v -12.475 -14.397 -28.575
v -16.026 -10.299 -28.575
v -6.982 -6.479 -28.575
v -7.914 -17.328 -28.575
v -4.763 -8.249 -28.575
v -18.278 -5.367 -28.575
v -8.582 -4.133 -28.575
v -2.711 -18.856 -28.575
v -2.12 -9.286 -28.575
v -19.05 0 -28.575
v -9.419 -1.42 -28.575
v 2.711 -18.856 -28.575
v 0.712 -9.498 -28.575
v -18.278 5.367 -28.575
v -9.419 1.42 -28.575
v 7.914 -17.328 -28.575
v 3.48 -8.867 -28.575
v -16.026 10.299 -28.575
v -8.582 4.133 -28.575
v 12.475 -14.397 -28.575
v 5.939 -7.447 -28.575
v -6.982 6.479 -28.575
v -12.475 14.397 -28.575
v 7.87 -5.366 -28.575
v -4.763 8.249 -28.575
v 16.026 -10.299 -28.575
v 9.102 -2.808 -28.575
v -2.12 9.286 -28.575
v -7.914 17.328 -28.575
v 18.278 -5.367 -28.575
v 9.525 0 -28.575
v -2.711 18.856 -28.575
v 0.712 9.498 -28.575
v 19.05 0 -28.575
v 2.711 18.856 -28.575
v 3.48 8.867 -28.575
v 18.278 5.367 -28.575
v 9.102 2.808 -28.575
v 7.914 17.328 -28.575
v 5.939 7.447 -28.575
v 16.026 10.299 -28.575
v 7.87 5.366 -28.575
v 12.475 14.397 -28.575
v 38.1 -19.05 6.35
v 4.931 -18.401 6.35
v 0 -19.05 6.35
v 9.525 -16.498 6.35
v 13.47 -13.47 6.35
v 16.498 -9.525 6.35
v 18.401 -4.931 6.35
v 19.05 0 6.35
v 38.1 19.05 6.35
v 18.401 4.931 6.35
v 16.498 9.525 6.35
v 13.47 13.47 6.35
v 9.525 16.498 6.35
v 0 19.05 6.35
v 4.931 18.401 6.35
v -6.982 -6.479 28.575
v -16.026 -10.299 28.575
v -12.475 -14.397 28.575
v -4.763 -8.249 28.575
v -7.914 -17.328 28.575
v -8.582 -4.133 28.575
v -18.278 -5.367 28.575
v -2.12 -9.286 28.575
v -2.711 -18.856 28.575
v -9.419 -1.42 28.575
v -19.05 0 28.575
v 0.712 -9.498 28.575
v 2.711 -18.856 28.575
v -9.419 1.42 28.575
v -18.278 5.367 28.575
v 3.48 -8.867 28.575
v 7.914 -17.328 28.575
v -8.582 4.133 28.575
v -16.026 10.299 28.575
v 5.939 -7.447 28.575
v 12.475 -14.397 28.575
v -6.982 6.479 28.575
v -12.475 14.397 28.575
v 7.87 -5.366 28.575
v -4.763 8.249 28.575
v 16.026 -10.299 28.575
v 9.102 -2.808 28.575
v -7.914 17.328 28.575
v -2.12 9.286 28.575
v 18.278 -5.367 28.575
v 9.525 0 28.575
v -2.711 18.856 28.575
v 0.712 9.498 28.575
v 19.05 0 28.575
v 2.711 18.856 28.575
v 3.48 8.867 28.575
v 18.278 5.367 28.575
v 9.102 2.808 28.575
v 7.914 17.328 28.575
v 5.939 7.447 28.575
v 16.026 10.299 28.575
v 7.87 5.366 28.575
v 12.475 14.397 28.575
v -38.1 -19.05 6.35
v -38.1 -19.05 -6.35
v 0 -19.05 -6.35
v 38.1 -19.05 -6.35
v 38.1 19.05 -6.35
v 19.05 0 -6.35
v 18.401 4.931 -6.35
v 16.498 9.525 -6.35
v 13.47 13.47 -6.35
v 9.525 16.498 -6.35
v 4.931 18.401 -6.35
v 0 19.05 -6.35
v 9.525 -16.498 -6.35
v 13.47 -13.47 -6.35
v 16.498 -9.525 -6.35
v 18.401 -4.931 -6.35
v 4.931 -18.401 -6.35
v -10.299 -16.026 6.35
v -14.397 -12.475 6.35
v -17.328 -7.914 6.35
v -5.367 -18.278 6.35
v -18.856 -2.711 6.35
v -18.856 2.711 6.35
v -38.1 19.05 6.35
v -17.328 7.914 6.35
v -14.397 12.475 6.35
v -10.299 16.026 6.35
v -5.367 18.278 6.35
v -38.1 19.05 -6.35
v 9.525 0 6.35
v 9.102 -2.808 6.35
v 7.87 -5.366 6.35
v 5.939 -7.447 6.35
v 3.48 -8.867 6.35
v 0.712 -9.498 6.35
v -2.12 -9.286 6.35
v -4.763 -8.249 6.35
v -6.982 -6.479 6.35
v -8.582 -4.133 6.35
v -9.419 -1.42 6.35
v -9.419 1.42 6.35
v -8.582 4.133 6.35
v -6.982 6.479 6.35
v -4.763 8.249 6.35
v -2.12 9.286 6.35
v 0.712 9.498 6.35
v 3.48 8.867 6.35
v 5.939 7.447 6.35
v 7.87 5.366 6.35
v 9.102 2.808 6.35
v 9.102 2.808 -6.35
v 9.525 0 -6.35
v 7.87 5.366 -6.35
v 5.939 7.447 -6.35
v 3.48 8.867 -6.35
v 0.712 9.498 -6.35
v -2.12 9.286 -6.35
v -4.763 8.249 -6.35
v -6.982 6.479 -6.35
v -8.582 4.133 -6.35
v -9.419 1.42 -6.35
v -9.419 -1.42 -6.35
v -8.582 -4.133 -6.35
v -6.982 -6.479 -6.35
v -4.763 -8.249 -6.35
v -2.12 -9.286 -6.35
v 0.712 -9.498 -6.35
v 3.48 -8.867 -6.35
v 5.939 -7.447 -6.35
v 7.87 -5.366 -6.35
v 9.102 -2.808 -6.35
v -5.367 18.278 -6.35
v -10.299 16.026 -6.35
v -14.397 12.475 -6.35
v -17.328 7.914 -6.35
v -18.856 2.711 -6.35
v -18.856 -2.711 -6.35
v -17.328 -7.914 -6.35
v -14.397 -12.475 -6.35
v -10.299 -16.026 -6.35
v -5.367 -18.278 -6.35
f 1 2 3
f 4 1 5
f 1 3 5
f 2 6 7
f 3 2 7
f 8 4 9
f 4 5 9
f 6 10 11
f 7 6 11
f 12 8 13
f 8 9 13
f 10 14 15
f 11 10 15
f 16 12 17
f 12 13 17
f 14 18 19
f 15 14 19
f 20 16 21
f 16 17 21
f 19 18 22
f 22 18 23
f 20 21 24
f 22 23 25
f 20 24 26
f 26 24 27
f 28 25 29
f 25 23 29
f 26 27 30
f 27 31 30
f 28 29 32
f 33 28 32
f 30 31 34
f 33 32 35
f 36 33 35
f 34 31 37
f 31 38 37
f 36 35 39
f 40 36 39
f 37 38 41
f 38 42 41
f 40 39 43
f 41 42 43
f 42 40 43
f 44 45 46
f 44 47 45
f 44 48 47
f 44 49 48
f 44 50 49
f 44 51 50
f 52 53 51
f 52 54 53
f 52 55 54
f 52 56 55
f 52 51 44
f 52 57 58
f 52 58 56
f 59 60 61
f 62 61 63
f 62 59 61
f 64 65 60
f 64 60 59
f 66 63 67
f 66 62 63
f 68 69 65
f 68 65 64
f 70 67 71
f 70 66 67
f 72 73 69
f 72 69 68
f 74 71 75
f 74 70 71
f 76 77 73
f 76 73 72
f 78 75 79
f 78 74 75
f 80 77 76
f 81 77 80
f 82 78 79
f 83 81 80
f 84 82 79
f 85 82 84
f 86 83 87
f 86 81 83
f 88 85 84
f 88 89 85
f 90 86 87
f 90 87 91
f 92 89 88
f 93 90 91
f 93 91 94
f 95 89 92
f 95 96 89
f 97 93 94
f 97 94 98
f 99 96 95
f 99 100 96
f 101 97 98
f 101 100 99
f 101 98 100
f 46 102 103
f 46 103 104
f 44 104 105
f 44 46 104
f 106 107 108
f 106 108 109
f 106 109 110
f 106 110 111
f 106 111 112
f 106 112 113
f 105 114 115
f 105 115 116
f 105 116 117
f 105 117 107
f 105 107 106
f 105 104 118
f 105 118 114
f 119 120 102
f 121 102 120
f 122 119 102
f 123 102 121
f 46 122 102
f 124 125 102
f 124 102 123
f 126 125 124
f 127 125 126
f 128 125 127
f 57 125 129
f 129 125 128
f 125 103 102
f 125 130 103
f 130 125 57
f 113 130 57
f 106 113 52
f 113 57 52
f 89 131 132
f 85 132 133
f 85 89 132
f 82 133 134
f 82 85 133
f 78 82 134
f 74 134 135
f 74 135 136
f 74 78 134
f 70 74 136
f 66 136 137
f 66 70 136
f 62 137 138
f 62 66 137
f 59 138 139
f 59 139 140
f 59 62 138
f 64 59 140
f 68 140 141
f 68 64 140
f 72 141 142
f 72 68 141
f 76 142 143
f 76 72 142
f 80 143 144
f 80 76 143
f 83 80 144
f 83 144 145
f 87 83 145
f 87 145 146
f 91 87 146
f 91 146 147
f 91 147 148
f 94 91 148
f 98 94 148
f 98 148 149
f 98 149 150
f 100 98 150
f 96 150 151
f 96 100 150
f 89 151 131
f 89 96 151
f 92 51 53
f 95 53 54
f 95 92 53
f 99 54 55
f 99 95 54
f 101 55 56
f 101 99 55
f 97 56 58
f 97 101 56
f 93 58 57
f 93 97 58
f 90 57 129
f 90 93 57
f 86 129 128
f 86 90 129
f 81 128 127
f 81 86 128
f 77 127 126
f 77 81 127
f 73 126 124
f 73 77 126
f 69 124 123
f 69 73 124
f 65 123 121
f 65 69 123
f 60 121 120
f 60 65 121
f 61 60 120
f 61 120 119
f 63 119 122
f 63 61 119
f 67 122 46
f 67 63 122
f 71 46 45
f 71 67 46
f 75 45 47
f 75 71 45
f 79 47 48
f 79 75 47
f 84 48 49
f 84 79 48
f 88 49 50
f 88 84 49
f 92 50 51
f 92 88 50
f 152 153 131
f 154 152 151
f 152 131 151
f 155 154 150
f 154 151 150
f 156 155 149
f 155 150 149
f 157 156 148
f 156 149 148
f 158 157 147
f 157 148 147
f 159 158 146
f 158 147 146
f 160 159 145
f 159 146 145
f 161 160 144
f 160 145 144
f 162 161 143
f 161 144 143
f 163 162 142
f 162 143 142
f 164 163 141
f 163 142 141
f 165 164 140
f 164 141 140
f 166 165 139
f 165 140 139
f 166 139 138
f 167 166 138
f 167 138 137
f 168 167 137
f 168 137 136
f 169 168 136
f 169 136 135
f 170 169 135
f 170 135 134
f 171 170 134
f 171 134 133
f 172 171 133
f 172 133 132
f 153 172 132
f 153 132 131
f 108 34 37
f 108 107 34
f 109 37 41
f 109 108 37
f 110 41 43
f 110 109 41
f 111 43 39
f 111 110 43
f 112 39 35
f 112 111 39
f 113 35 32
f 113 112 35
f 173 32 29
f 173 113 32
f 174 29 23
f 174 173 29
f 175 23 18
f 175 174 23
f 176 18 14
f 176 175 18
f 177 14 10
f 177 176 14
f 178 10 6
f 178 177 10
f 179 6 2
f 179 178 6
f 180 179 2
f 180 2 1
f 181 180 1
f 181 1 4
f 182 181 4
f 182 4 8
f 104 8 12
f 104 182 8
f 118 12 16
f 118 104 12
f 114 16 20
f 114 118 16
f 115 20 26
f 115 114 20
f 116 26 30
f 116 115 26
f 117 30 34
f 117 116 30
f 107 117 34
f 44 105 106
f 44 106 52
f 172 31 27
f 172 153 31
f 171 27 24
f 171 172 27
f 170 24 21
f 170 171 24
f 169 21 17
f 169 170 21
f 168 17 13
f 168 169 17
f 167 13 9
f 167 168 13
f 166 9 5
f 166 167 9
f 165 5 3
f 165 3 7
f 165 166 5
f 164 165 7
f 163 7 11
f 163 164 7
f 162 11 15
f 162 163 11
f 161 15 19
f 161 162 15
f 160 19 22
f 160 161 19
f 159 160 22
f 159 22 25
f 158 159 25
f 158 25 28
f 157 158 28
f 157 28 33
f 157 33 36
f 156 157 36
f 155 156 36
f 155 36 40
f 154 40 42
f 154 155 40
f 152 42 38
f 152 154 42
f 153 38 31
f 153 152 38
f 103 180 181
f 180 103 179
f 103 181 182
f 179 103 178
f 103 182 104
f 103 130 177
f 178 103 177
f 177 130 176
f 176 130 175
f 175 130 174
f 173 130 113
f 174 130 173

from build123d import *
from build123d import SkipClean  # not in build123d's __all__

# Parameters (mm, degrees)
F1_DEPTH      = 28.575
F2_W          = 76.2
F2_H          = 12.7
F3_DEPTH      = 19.05
F3_DEPTH_BACK = 19.05
F4_R          = 9.525
F5_DEPTH      = 34.926


with BuildPart() as f1:
    # F0 (on Top) → F1 (new body, symmetric)
    with BuildSketch(Plane.XY):
        with BuildLine():
            ThreePointArc((0, 19.05), (-19.05, 0), (0, -19.05))
            Line((0, -19.05), (0, -9.525))
            ThreePointArc((0, -9.525), (-9.525, 0), (0, 9.525))
            Line((0, 9.525), (0, 19.05))
        make_face()
        with BuildLine():
            Line((0, -9.525), (0, -19.05))
            ThreePointArc((0, -19.05), (13.4703841816, -13.4703841816), (19.05, 0))
            ThreePointArc((19.05, 0), (13.4703841816, 13.4703841816), (0, 19.05))
            Line((0, 19.05), (0, 9.525))
            ThreePointArc((0, 9.525), (6.7351920908, 6.7351920908), (9.525, 0))
            ThreePointArc((9.525, 0), (6.7351920908, -6.7351920908), (0, -9.525))
        make_face()
    extrude(amount=F1_DEPTH, both=True)

    # F2 (on Front) → F3 (join, two sides)
    with BuildSketch(Plane.XZ) as f3_sk:
        Rectangle(F2_W, F2_H)
    extrude(amount=-F3_DEPTH)
    extrude(f3_sk.sketch, amount=F3_DEPTH_BACK)

    # F4 (on face) → F5 (cut, through all)
    with BuildSketch(Plane.XY.offset(6.35)):
        Circle(F4_R)
    with SkipClean():  # cleaning this boolean's faces spoils the solid; the shape is the same uncleaned
        extrude(amount=-F5_DEPTH, mode=Mode.SUBTRACT)


solid = f1.part
